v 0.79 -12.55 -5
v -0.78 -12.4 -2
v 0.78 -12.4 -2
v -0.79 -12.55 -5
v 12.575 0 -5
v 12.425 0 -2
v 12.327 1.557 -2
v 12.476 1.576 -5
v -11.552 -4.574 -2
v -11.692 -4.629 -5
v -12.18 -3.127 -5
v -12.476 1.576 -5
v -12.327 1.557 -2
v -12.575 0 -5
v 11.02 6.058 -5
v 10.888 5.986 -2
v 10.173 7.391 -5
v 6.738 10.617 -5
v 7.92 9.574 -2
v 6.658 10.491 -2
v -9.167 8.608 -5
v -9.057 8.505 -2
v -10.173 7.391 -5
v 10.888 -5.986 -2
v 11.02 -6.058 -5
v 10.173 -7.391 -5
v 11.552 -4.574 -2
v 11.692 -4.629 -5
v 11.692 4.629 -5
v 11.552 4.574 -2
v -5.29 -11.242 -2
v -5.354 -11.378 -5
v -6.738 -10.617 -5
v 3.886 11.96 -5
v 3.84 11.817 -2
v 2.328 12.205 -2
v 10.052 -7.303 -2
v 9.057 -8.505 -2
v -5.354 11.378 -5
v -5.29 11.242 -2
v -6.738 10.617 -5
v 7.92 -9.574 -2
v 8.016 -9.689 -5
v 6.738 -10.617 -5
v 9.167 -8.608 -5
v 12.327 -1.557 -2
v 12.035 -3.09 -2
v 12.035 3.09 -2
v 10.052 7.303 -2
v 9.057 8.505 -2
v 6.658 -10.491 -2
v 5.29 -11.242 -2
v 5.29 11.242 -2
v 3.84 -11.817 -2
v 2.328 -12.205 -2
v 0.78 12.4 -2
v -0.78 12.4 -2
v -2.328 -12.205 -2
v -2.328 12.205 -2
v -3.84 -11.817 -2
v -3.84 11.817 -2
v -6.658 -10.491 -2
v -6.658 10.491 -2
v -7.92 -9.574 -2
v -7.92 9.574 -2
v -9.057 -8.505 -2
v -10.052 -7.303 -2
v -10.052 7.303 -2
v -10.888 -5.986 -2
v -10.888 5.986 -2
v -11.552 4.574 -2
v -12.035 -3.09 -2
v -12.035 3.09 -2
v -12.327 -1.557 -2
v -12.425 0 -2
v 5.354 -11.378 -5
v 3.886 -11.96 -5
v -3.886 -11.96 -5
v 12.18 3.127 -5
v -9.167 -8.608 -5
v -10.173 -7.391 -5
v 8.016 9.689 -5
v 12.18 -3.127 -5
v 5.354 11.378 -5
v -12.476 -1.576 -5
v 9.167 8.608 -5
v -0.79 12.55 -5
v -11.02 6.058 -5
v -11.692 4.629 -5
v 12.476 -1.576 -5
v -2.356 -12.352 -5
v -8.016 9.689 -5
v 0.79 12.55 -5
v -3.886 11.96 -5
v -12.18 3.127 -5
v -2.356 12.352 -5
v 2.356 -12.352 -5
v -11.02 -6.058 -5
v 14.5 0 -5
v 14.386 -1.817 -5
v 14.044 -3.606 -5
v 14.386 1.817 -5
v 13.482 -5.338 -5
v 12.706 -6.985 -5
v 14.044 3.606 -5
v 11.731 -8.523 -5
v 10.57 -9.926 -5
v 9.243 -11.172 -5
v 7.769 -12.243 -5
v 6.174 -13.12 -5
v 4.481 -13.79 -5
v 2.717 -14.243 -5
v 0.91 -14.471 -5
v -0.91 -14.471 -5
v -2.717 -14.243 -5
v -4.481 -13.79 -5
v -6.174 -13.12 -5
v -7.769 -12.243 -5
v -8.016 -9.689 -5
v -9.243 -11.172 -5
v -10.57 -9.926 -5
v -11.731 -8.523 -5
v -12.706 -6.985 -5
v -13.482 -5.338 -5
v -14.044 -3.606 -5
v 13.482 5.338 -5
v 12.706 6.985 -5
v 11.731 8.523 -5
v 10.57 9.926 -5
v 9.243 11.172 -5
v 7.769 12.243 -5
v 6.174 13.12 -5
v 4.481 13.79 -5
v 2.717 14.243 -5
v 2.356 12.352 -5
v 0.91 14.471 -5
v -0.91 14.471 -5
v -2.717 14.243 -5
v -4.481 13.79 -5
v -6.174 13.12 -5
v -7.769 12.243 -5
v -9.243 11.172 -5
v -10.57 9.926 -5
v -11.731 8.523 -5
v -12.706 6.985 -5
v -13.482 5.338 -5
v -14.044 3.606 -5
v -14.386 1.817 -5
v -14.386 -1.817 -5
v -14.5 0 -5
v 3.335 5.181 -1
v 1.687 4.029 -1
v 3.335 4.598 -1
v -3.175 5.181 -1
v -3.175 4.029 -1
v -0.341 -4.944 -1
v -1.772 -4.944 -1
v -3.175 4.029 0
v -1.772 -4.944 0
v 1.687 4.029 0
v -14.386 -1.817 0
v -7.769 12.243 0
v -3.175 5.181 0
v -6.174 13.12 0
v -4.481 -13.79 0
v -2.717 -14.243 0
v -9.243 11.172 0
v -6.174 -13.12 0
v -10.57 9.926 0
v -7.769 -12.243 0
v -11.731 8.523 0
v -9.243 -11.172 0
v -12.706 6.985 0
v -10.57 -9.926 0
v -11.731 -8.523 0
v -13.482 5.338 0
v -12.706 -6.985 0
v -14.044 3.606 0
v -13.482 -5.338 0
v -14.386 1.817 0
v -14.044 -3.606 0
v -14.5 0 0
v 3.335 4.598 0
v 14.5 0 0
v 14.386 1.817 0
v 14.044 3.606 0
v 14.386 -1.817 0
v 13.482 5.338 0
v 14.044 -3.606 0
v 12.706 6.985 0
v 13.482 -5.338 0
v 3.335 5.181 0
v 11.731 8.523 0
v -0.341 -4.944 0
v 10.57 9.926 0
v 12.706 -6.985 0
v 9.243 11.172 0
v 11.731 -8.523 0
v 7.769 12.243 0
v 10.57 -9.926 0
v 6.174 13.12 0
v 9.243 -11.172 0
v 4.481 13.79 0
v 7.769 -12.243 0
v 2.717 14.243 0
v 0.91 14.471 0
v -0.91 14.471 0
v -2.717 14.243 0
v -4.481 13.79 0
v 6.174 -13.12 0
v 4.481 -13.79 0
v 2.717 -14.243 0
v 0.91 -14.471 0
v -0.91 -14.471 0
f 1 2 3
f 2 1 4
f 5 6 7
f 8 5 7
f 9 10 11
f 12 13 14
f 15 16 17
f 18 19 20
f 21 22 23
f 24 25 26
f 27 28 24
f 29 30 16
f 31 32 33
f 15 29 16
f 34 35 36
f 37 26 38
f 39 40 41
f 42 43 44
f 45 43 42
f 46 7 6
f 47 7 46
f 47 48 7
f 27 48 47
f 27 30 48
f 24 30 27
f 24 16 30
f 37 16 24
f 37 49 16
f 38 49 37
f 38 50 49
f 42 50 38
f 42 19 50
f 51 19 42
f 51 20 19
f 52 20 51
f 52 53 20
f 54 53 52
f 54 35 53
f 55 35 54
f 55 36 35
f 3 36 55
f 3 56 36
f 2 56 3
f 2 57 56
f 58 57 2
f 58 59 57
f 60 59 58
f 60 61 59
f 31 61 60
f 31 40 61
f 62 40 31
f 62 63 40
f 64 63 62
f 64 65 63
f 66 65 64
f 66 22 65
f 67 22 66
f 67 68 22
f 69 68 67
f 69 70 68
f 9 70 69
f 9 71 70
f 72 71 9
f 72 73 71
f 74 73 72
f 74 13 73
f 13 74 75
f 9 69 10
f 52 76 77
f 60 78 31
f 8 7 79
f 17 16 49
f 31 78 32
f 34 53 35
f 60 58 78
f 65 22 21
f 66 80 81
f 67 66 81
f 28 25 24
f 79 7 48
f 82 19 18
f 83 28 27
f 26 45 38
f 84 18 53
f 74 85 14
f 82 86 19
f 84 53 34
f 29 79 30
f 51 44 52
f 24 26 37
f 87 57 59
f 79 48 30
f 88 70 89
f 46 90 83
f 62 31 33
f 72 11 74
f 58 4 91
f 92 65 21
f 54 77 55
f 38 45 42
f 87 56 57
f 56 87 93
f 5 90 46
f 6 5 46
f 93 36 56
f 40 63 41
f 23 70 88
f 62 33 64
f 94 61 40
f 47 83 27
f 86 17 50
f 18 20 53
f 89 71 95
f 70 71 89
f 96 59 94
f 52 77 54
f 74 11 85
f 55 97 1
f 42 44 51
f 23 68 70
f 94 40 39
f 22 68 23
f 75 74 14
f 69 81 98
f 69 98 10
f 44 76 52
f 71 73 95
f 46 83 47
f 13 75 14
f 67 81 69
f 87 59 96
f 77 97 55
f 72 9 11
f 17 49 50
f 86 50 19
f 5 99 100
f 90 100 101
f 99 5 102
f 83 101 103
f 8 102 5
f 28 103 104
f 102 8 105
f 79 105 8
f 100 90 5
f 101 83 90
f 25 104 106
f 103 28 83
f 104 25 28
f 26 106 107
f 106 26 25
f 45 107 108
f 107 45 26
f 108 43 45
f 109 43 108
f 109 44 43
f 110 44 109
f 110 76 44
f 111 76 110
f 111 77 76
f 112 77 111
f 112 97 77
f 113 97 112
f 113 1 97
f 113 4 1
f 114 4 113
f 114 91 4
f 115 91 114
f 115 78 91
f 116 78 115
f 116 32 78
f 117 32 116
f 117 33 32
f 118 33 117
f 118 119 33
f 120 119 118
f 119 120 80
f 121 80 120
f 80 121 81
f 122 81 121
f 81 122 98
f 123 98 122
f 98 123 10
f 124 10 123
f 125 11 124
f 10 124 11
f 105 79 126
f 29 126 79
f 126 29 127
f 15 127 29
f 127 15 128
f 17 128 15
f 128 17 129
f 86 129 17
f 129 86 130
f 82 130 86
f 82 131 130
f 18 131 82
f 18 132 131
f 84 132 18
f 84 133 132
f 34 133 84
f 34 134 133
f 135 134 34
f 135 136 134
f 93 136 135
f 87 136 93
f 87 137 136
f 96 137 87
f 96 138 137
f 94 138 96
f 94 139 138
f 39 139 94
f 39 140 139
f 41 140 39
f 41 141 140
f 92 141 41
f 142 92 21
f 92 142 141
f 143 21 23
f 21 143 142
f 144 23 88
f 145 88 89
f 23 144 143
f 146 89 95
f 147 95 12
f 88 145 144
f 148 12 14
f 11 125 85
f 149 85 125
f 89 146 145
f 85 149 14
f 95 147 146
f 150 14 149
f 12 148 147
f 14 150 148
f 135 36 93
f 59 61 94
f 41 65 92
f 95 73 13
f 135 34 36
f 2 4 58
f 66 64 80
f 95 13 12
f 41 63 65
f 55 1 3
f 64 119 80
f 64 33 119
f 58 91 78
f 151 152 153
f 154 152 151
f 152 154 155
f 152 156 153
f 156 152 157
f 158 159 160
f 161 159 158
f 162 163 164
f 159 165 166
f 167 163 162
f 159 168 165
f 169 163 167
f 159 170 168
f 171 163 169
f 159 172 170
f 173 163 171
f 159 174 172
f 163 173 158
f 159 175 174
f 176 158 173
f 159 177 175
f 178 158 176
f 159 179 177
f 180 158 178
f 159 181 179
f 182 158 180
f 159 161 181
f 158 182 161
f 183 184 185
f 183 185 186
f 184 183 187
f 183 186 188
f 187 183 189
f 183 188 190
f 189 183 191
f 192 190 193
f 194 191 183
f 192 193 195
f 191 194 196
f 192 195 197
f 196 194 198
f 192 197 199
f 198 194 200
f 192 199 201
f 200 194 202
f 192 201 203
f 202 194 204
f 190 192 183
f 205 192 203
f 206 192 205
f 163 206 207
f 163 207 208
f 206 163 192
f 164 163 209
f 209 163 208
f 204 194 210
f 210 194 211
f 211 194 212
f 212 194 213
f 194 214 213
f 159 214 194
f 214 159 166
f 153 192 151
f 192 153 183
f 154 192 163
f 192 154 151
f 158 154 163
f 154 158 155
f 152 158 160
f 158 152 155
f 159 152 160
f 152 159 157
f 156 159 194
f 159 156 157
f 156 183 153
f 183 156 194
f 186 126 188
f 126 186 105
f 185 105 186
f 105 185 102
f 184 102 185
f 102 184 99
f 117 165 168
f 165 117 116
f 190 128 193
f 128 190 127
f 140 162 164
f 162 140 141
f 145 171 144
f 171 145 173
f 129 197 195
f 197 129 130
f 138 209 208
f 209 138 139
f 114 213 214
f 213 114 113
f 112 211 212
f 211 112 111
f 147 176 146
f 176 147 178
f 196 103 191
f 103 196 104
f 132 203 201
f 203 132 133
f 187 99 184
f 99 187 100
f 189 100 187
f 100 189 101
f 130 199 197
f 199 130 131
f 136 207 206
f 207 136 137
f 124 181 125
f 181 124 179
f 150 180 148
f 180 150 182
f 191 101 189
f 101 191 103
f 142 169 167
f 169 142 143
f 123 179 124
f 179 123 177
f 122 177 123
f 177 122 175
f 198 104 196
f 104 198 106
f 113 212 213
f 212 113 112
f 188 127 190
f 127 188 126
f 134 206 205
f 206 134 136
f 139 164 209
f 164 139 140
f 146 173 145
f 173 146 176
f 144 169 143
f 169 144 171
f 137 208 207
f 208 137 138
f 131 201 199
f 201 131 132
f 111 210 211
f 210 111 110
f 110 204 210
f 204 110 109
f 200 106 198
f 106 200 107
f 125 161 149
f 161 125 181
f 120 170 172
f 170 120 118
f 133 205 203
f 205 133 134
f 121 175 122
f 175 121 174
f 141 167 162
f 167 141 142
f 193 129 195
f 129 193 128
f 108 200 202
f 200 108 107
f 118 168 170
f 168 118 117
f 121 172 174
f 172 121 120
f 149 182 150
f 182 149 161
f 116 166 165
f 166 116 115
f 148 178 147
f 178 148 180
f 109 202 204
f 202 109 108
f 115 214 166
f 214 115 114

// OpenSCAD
$fn = 50;

difference() {
	union() {
		translate(v = [0, 0, -5.0]) {
			cylinder(h = 5, r = 14.5);
		}
	}
	union() {
		#translate(v = [0, 0, -5.0]) {
			cylinder(h = 3, r1 = 12.575, r2 = 12.425);
		}
		translate(v = [0, 0, -1]) {
			linear_extrude(height = 1) {
				text(font = "Impact", halign = "center", size = 10, text = "7", valign = "center");
			}
		}
	}
}
